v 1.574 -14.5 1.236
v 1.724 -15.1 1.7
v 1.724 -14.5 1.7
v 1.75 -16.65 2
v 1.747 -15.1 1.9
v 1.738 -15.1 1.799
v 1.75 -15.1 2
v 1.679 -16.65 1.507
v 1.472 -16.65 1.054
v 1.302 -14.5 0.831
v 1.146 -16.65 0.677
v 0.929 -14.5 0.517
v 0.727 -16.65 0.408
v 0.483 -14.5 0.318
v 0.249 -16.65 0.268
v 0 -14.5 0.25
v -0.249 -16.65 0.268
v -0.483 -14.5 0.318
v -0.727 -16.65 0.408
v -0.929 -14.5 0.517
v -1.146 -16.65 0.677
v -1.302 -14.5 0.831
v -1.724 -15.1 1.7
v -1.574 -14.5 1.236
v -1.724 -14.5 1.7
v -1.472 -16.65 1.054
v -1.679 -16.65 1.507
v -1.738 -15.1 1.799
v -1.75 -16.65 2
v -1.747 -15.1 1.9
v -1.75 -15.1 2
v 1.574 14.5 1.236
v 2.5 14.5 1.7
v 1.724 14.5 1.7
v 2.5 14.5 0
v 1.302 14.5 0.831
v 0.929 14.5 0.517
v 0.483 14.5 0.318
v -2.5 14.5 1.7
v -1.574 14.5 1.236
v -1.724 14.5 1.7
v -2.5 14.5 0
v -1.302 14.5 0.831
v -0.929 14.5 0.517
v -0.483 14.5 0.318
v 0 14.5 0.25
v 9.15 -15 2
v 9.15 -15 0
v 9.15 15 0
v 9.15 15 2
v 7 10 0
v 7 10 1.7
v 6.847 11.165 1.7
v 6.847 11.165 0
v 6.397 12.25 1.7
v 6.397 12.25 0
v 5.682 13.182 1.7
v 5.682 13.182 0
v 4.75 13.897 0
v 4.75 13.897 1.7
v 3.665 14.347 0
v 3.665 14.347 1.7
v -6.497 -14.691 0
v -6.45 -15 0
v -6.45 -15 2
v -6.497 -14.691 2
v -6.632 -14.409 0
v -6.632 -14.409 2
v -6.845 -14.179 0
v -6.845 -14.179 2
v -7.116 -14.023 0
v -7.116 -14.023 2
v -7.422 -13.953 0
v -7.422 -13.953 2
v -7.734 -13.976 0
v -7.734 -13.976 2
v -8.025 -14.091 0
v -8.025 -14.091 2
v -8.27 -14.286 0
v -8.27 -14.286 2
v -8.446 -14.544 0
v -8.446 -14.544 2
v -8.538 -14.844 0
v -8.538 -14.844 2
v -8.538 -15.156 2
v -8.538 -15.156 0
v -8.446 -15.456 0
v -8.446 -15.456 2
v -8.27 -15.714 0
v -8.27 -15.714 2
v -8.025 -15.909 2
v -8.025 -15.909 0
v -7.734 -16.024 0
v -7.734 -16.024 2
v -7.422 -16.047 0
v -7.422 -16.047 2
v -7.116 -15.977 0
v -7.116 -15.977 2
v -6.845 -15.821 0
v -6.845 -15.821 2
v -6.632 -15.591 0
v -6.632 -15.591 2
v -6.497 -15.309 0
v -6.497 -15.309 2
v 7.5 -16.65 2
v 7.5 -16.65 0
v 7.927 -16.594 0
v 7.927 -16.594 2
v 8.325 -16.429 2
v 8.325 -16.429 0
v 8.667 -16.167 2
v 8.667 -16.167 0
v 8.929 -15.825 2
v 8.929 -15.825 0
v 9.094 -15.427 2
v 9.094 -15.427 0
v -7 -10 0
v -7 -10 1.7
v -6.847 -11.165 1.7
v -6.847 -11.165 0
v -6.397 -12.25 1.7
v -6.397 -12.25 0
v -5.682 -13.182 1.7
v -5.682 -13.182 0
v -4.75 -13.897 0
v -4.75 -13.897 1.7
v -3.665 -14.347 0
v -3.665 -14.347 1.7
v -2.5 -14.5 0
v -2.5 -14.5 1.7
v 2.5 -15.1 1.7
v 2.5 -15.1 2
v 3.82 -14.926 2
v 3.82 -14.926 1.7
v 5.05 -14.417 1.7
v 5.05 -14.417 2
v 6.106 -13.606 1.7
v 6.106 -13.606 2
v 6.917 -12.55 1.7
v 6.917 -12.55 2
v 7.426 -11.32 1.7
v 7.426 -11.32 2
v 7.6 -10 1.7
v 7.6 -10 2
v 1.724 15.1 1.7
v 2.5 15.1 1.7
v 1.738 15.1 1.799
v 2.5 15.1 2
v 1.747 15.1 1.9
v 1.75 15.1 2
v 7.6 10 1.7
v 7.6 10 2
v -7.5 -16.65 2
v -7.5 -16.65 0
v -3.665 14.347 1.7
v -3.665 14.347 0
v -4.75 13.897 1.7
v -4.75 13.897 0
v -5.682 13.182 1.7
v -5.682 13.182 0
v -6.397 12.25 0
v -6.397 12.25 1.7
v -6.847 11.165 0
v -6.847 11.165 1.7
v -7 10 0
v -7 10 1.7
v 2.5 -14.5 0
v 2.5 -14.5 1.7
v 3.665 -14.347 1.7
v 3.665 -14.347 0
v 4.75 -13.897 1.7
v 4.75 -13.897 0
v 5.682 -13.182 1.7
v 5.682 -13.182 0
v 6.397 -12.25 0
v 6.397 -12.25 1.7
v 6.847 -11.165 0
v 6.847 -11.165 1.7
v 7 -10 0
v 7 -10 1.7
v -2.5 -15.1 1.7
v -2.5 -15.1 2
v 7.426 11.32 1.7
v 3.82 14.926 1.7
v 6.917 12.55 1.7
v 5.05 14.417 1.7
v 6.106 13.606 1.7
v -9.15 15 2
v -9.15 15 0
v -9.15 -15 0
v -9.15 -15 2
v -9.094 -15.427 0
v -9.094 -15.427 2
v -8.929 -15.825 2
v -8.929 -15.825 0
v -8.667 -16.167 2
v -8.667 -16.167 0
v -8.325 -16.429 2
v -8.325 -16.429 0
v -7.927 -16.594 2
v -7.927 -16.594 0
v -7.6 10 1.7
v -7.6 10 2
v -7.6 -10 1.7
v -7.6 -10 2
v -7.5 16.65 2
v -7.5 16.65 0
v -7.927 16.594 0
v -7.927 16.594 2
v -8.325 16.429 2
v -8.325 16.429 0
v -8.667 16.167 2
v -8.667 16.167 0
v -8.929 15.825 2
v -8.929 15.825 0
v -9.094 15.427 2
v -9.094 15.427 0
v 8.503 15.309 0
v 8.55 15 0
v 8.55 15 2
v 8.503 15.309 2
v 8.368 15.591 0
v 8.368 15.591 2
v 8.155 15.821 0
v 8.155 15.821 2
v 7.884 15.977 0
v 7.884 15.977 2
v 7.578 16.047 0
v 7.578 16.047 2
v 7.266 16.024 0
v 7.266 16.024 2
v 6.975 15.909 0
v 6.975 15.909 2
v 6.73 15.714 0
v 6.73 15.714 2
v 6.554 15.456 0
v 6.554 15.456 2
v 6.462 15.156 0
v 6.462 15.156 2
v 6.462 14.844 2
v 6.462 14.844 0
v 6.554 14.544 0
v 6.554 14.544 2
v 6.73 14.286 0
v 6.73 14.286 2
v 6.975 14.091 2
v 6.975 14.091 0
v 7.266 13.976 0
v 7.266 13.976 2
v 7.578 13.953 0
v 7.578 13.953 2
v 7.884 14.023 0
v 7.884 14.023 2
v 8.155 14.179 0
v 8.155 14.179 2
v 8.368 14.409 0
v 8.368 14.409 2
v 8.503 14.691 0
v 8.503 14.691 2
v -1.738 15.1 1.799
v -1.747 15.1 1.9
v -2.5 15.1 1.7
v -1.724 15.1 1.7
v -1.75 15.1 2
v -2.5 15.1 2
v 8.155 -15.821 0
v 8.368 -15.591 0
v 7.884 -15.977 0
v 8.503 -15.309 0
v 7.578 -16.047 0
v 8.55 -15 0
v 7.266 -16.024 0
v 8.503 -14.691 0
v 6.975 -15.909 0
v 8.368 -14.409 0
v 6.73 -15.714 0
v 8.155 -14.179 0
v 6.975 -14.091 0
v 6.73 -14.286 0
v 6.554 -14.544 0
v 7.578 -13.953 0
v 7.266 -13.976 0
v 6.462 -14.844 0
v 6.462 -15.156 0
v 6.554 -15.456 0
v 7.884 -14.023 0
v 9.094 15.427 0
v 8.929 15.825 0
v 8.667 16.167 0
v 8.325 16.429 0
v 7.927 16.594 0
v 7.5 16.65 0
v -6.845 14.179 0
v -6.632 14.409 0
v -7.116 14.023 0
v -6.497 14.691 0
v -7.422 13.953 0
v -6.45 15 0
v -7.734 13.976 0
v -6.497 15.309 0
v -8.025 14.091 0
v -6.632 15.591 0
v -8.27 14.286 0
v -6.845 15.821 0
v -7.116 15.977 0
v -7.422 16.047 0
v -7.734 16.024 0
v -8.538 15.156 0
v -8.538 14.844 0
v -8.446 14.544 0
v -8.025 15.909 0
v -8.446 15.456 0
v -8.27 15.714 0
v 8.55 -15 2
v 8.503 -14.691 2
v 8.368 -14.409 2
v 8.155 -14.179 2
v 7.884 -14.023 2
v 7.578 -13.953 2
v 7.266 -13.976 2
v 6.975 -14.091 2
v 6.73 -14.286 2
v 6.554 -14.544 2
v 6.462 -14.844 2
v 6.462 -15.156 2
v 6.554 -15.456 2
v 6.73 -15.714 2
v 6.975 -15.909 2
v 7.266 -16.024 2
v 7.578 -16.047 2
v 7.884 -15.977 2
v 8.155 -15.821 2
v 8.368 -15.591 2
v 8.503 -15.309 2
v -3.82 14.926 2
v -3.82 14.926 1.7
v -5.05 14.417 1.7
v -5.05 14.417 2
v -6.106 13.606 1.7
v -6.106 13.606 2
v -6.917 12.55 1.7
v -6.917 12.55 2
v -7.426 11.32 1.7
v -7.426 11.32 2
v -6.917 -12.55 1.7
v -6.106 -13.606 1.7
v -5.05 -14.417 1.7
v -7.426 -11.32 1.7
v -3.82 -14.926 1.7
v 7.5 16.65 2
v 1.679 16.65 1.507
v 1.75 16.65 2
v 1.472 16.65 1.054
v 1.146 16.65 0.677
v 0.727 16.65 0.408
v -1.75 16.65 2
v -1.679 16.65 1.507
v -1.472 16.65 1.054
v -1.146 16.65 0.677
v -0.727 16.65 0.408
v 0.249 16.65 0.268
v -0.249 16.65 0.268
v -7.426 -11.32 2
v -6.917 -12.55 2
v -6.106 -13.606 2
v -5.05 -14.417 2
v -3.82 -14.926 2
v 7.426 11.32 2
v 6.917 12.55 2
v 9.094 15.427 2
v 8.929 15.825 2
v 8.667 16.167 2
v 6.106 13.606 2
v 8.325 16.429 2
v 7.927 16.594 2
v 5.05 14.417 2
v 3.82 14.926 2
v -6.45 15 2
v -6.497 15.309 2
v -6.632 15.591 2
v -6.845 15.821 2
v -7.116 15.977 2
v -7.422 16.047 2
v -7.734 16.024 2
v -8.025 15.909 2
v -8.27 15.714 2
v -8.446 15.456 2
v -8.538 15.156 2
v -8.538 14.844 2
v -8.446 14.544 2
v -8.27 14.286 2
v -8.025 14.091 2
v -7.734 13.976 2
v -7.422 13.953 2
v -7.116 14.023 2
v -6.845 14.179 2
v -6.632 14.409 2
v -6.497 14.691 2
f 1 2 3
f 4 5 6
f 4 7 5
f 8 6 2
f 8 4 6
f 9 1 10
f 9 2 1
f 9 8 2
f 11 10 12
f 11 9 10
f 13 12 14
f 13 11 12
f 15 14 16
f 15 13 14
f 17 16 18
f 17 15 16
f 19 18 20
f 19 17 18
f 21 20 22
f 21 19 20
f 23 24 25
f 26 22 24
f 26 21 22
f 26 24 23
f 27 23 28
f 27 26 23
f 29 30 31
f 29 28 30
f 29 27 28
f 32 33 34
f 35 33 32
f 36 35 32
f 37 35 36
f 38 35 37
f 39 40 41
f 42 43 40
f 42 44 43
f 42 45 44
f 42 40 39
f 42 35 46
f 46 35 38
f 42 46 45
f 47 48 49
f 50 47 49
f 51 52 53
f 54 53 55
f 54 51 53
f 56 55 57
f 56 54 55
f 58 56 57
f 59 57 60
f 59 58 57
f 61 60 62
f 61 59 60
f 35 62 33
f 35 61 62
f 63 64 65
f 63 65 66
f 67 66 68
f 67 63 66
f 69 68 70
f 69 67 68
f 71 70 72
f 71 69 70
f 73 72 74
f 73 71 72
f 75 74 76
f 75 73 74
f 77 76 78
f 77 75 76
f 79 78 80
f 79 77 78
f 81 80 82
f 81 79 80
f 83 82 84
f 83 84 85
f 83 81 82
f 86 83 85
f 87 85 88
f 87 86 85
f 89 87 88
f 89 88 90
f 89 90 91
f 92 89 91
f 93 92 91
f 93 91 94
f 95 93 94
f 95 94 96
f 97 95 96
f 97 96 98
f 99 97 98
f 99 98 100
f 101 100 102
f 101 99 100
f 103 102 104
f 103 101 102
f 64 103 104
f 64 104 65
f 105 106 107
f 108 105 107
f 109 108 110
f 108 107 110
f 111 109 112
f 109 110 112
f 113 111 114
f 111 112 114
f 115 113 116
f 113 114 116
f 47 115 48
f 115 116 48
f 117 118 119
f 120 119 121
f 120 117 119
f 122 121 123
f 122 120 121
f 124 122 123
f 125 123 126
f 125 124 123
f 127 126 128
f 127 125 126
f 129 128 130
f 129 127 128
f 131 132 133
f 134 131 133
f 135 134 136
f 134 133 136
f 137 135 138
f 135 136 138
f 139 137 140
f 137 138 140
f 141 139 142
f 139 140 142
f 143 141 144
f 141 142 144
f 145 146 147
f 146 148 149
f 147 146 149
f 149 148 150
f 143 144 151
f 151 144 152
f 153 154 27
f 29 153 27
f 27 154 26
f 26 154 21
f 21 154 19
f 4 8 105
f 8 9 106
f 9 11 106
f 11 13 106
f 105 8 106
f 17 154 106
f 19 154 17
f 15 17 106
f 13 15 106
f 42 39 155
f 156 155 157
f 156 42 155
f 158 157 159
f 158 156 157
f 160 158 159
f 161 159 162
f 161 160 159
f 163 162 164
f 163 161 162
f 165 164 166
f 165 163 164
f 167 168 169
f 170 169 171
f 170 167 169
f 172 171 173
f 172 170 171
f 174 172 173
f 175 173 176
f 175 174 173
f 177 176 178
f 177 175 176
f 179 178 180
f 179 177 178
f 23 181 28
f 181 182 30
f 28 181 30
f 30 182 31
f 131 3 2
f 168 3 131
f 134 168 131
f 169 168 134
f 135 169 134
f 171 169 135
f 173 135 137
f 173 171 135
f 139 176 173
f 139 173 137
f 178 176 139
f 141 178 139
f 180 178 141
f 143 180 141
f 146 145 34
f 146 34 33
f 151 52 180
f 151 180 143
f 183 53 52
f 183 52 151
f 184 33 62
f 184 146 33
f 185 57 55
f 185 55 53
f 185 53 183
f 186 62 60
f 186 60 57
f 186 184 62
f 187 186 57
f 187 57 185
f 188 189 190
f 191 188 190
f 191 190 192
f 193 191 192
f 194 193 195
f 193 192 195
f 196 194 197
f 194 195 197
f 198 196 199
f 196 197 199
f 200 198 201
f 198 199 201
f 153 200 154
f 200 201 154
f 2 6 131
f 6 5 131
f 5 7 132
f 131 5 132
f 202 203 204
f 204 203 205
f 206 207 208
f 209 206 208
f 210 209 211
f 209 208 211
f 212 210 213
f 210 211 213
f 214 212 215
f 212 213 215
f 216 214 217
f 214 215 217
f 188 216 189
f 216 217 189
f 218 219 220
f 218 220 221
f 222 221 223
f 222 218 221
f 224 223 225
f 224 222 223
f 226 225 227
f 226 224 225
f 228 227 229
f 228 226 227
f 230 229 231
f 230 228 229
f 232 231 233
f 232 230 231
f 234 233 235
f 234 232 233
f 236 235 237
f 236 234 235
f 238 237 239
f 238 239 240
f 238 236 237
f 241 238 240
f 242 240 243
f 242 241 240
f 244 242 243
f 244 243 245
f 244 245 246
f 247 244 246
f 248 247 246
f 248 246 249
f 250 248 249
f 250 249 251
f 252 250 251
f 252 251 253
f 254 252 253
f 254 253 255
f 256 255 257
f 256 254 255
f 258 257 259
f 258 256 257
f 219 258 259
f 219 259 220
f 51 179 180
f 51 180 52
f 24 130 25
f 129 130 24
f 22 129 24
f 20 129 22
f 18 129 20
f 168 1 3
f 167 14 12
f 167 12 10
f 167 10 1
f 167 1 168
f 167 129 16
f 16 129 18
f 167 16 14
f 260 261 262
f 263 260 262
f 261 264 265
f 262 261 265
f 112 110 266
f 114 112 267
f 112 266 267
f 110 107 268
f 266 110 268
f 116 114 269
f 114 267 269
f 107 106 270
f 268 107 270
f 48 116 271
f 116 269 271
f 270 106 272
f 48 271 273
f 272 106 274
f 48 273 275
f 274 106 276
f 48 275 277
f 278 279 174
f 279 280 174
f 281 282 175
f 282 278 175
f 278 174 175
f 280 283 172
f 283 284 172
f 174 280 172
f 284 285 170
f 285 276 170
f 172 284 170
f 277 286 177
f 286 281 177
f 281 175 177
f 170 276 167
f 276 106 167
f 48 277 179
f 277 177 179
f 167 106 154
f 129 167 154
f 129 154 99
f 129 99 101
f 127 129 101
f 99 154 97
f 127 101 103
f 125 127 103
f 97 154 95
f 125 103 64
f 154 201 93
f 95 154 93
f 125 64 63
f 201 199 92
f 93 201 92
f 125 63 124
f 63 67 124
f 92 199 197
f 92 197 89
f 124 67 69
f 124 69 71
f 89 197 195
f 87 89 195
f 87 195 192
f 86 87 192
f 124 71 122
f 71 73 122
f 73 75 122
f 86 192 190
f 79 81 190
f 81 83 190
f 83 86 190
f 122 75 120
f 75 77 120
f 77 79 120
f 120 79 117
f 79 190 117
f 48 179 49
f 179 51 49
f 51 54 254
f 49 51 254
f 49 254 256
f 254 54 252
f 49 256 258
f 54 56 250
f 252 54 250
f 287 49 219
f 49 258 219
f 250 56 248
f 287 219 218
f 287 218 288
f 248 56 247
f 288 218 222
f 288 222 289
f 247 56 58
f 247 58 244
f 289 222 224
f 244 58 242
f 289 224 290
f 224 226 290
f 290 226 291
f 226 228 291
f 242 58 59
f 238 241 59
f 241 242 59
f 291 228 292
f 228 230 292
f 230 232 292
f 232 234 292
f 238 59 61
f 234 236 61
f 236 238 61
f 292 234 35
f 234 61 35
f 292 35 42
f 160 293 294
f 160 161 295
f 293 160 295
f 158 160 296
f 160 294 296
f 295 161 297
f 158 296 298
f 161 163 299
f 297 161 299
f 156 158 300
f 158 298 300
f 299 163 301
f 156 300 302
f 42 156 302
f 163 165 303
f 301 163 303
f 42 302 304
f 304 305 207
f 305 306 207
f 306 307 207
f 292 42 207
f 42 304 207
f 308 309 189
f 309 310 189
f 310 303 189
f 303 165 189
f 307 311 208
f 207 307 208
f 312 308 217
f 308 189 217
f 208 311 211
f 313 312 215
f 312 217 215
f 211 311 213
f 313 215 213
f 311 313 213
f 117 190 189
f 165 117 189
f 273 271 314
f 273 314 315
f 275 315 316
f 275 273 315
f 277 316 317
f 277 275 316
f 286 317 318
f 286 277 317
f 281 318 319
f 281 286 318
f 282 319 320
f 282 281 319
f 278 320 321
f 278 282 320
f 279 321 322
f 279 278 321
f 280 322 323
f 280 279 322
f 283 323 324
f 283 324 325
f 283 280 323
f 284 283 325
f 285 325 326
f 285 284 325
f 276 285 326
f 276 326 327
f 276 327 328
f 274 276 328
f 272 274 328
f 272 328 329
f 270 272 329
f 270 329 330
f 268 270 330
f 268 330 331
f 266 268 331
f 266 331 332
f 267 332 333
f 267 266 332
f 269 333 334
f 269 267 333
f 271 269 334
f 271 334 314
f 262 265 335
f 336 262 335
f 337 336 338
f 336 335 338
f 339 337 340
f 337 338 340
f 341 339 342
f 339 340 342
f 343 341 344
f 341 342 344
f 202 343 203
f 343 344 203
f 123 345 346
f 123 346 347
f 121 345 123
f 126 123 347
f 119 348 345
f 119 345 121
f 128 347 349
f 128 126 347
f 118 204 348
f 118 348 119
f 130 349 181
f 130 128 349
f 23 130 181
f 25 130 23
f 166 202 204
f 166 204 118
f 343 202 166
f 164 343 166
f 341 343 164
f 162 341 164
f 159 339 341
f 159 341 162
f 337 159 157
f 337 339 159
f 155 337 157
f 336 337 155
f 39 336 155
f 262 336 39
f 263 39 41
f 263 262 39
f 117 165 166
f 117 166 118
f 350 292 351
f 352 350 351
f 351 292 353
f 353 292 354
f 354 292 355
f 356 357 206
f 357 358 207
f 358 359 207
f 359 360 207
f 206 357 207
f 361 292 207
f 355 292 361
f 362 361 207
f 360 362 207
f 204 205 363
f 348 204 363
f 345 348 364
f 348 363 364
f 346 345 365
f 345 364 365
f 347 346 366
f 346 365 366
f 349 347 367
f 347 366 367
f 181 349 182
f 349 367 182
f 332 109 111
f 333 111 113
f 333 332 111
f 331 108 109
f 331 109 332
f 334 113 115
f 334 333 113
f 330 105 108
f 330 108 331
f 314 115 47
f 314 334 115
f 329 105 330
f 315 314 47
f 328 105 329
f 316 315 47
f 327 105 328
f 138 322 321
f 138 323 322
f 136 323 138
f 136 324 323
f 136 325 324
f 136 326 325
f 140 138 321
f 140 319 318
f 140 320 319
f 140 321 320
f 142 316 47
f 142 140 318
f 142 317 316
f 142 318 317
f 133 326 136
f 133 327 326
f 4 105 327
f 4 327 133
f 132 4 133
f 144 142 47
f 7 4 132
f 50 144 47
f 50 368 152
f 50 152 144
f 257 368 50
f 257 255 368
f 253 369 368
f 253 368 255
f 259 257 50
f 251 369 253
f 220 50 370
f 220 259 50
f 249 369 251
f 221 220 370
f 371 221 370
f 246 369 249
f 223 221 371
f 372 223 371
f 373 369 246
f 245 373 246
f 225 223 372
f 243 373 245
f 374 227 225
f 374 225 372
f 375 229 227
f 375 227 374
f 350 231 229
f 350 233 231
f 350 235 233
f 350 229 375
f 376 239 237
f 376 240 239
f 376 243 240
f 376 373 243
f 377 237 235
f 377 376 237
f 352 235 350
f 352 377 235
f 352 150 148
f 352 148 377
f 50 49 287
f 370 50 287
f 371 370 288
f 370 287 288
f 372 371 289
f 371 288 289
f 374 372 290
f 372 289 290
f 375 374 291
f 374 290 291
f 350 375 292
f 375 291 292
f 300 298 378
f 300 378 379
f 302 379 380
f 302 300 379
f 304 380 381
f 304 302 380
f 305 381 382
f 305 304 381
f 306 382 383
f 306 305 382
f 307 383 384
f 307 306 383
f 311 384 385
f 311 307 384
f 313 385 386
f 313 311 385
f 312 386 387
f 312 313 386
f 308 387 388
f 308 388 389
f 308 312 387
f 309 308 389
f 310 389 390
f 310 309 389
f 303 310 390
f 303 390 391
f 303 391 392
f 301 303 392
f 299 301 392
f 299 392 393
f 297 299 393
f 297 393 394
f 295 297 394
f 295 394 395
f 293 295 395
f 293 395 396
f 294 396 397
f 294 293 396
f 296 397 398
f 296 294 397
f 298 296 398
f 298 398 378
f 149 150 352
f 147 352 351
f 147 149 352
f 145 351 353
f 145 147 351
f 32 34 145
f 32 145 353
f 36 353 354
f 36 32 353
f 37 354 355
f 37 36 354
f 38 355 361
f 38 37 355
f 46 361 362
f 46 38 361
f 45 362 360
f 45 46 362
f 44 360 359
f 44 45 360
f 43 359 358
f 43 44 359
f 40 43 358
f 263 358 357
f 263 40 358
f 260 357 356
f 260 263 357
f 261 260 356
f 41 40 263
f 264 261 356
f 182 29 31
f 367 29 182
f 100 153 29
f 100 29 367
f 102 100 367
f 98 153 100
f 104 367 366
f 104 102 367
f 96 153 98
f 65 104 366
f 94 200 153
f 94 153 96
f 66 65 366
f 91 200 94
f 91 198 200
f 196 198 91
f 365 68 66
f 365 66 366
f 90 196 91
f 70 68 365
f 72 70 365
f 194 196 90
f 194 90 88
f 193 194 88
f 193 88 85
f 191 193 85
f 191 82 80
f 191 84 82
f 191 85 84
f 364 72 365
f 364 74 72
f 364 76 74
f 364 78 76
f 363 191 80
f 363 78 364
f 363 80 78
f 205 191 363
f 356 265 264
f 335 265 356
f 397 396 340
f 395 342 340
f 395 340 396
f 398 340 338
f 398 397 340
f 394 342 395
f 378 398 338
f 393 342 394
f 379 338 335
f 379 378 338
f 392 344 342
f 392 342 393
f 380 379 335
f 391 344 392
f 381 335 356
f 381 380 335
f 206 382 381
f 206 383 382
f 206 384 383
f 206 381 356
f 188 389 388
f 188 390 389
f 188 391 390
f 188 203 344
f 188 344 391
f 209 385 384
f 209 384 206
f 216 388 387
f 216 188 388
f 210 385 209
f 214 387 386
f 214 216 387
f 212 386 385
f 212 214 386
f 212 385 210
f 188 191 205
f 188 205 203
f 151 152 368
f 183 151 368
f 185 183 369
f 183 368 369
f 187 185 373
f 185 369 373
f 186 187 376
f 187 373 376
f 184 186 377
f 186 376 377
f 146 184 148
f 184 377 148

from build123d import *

# Parameters (mm, degrees)
SKIZZE1_R                       = 1.05
AUFSATZ_LINEAR_AUSTRAGEN1_DEPTH = 2
SCHNITT_LINEAR_AUSTRAGEN1_DEPTH = 0.3
SCHNITT_LINEAR_AUSTRAGEN2_REACH = 36.592


with BuildPart() as part:
    # Skizze1 → Aufsatz-Linear austragen1 (new body)
    with BuildSketch(Plane(origin=(0, 0, 0), x_dir=(0, 1, 0), z_dir=(0, 0, 1))):
        with BuildLine():
            Line((-16.65, 7.5), (-16.65, -7.5))
            ThreePointArc((-16.65, -7.5), (-16.166726189, -8.666726189), (-15, -9.15))
            Line((-15, -9.15), (15, -9.15))
            ThreePointArc((15, -9.15), (16.166726189, -8.666726189), (16.65, -7.5))
            Line((16.65, -7.5), (16.65, 7.5))
            ThreePointArc((16.65, 7.5), (16.166726189, 8.666726189), (15, 9.15))
            Line((15, 9.15), (-15, 9.15))
            ThreePointArc((-15, 9.15), (-16.166726189, 8.666726189), (-16.65, 7.5))
        make_face()
        with Locations(Location((-15, 7.5, 0), (0, 0, 270))):
            Circle(SKIZZE1_R, mode=Mode.SUBTRACT)
        with Locations(Location((15, 7.5, 0), (0, 0, 270))):
            Circle(SKIZZE1_R, mode=Mode.SUBTRACT)
        with Locations(Location((15, -7.5, 0), (0, 0, 270))):
            Circle(SKIZZE1_R, mode=Mode.SUBTRACT)
        with Locations(Location((-15, -7.5, 0), (0, 0, 270))):
            Circle(SKIZZE1_R, mode=Mode.SUBTRACT)
        with BuildLine():
            Line((-14.5, 2.5), (-14.5, -2.5))
            ThreePointArc((-14.5, -2.5), (-13.181980515, -5.681980515), (-10, -7))
            Line((-10, -7), (10, -7))
            ThreePointArc((10, -7), (13.181980515, -5.681980515), (14.5, -2.5))
            Line((14.5, -2.5), (14.5, 2.5))
            ThreePointArc((14.5, 2.5), (13.181980515, 5.681980515), (10, 7))
            Line((10, 7), (-10, 7))
            ThreePointArc((-10, 7), (-13.181980515, 5.681980515), (-14.5, 2.5))
        make_face(mode=Mode.SUBTRACT)
    extrude(amount=AUFSATZ_LINEAR_AUSTRAGEN1_DEPTH)

    # Skizze2 → Schnitt-Linear austragen1 (cut)
    with BuildSketch(Plane.XY.offset(2)):
        with BuildLine():
            Line((-2.5, -15.1), (2.5, -15.1))
            ThreePointArc((2.5, -15.1), (6.106244584, -13.606244584), (7.6, -10))
            Line((7.6, -10), (7.6, 10))
            ThreePointArc((7.6, 10), (6.106244584, 13.606244584), (2.5, 15.1))
            Line((2.5, 15.1), (-2.5, 15.1))
            ThreePointArc((-2.5, 15.1), (-6.106244584, 13.606244584), (-7.6, 10))
            Line((-7.6, 10), (-7.6, -10))
            ThreePointArc((-7.6, -10), (-6.106244584, -13.606244584), (-2.5, -15.1))
        make_face()
    extrude(amount=-SCHNITT_LINEAR_AUSTRAGEN1_DEPTH, mode=Mode.SUBTRACT)

    # Schnitt-Linear austragen2: up to this face of the body (flat: up to its plane)
    schnitt_linear_austragen2_end = Plane(part.part.faces().sort_by_distance((0, 16.65, 1))[0])
    # Skizze3 → Schnitt-Linear austragen2 (cut, up to the picked face)
    with BuildSketch(Plane.XZ.offset(16.65), mode=Mode.PRIVATE) as schnitt_linear_austragen2_sk1:
        with BuildLine():
            Line((-1.75, 2), (1.75, 2))
            ThreePointArc((1.75, 2), (0, 0.25), (-1.75, 2))
        make_face()
    schnitt_linear_austragen2_tool1 = split(extrude(schnitt_linear_austragen2_sk1.sketch, amount=-SCHNITT_LINEAR_AUSTRAGEN2_REACH, mode=Mode.PRIVATE), bisect_by=schnitt_linear_austragen2_end, keep=Keep.BOTH, mode=Mode.PRIVATE)
    add(schnitt_linear_austragen2_tool1.solids().sort_by(Axis((0, -16.65, 1.257277), (0, 1, 0)))[0], mode=Mode.SUBTRACT)


solid = part.part
